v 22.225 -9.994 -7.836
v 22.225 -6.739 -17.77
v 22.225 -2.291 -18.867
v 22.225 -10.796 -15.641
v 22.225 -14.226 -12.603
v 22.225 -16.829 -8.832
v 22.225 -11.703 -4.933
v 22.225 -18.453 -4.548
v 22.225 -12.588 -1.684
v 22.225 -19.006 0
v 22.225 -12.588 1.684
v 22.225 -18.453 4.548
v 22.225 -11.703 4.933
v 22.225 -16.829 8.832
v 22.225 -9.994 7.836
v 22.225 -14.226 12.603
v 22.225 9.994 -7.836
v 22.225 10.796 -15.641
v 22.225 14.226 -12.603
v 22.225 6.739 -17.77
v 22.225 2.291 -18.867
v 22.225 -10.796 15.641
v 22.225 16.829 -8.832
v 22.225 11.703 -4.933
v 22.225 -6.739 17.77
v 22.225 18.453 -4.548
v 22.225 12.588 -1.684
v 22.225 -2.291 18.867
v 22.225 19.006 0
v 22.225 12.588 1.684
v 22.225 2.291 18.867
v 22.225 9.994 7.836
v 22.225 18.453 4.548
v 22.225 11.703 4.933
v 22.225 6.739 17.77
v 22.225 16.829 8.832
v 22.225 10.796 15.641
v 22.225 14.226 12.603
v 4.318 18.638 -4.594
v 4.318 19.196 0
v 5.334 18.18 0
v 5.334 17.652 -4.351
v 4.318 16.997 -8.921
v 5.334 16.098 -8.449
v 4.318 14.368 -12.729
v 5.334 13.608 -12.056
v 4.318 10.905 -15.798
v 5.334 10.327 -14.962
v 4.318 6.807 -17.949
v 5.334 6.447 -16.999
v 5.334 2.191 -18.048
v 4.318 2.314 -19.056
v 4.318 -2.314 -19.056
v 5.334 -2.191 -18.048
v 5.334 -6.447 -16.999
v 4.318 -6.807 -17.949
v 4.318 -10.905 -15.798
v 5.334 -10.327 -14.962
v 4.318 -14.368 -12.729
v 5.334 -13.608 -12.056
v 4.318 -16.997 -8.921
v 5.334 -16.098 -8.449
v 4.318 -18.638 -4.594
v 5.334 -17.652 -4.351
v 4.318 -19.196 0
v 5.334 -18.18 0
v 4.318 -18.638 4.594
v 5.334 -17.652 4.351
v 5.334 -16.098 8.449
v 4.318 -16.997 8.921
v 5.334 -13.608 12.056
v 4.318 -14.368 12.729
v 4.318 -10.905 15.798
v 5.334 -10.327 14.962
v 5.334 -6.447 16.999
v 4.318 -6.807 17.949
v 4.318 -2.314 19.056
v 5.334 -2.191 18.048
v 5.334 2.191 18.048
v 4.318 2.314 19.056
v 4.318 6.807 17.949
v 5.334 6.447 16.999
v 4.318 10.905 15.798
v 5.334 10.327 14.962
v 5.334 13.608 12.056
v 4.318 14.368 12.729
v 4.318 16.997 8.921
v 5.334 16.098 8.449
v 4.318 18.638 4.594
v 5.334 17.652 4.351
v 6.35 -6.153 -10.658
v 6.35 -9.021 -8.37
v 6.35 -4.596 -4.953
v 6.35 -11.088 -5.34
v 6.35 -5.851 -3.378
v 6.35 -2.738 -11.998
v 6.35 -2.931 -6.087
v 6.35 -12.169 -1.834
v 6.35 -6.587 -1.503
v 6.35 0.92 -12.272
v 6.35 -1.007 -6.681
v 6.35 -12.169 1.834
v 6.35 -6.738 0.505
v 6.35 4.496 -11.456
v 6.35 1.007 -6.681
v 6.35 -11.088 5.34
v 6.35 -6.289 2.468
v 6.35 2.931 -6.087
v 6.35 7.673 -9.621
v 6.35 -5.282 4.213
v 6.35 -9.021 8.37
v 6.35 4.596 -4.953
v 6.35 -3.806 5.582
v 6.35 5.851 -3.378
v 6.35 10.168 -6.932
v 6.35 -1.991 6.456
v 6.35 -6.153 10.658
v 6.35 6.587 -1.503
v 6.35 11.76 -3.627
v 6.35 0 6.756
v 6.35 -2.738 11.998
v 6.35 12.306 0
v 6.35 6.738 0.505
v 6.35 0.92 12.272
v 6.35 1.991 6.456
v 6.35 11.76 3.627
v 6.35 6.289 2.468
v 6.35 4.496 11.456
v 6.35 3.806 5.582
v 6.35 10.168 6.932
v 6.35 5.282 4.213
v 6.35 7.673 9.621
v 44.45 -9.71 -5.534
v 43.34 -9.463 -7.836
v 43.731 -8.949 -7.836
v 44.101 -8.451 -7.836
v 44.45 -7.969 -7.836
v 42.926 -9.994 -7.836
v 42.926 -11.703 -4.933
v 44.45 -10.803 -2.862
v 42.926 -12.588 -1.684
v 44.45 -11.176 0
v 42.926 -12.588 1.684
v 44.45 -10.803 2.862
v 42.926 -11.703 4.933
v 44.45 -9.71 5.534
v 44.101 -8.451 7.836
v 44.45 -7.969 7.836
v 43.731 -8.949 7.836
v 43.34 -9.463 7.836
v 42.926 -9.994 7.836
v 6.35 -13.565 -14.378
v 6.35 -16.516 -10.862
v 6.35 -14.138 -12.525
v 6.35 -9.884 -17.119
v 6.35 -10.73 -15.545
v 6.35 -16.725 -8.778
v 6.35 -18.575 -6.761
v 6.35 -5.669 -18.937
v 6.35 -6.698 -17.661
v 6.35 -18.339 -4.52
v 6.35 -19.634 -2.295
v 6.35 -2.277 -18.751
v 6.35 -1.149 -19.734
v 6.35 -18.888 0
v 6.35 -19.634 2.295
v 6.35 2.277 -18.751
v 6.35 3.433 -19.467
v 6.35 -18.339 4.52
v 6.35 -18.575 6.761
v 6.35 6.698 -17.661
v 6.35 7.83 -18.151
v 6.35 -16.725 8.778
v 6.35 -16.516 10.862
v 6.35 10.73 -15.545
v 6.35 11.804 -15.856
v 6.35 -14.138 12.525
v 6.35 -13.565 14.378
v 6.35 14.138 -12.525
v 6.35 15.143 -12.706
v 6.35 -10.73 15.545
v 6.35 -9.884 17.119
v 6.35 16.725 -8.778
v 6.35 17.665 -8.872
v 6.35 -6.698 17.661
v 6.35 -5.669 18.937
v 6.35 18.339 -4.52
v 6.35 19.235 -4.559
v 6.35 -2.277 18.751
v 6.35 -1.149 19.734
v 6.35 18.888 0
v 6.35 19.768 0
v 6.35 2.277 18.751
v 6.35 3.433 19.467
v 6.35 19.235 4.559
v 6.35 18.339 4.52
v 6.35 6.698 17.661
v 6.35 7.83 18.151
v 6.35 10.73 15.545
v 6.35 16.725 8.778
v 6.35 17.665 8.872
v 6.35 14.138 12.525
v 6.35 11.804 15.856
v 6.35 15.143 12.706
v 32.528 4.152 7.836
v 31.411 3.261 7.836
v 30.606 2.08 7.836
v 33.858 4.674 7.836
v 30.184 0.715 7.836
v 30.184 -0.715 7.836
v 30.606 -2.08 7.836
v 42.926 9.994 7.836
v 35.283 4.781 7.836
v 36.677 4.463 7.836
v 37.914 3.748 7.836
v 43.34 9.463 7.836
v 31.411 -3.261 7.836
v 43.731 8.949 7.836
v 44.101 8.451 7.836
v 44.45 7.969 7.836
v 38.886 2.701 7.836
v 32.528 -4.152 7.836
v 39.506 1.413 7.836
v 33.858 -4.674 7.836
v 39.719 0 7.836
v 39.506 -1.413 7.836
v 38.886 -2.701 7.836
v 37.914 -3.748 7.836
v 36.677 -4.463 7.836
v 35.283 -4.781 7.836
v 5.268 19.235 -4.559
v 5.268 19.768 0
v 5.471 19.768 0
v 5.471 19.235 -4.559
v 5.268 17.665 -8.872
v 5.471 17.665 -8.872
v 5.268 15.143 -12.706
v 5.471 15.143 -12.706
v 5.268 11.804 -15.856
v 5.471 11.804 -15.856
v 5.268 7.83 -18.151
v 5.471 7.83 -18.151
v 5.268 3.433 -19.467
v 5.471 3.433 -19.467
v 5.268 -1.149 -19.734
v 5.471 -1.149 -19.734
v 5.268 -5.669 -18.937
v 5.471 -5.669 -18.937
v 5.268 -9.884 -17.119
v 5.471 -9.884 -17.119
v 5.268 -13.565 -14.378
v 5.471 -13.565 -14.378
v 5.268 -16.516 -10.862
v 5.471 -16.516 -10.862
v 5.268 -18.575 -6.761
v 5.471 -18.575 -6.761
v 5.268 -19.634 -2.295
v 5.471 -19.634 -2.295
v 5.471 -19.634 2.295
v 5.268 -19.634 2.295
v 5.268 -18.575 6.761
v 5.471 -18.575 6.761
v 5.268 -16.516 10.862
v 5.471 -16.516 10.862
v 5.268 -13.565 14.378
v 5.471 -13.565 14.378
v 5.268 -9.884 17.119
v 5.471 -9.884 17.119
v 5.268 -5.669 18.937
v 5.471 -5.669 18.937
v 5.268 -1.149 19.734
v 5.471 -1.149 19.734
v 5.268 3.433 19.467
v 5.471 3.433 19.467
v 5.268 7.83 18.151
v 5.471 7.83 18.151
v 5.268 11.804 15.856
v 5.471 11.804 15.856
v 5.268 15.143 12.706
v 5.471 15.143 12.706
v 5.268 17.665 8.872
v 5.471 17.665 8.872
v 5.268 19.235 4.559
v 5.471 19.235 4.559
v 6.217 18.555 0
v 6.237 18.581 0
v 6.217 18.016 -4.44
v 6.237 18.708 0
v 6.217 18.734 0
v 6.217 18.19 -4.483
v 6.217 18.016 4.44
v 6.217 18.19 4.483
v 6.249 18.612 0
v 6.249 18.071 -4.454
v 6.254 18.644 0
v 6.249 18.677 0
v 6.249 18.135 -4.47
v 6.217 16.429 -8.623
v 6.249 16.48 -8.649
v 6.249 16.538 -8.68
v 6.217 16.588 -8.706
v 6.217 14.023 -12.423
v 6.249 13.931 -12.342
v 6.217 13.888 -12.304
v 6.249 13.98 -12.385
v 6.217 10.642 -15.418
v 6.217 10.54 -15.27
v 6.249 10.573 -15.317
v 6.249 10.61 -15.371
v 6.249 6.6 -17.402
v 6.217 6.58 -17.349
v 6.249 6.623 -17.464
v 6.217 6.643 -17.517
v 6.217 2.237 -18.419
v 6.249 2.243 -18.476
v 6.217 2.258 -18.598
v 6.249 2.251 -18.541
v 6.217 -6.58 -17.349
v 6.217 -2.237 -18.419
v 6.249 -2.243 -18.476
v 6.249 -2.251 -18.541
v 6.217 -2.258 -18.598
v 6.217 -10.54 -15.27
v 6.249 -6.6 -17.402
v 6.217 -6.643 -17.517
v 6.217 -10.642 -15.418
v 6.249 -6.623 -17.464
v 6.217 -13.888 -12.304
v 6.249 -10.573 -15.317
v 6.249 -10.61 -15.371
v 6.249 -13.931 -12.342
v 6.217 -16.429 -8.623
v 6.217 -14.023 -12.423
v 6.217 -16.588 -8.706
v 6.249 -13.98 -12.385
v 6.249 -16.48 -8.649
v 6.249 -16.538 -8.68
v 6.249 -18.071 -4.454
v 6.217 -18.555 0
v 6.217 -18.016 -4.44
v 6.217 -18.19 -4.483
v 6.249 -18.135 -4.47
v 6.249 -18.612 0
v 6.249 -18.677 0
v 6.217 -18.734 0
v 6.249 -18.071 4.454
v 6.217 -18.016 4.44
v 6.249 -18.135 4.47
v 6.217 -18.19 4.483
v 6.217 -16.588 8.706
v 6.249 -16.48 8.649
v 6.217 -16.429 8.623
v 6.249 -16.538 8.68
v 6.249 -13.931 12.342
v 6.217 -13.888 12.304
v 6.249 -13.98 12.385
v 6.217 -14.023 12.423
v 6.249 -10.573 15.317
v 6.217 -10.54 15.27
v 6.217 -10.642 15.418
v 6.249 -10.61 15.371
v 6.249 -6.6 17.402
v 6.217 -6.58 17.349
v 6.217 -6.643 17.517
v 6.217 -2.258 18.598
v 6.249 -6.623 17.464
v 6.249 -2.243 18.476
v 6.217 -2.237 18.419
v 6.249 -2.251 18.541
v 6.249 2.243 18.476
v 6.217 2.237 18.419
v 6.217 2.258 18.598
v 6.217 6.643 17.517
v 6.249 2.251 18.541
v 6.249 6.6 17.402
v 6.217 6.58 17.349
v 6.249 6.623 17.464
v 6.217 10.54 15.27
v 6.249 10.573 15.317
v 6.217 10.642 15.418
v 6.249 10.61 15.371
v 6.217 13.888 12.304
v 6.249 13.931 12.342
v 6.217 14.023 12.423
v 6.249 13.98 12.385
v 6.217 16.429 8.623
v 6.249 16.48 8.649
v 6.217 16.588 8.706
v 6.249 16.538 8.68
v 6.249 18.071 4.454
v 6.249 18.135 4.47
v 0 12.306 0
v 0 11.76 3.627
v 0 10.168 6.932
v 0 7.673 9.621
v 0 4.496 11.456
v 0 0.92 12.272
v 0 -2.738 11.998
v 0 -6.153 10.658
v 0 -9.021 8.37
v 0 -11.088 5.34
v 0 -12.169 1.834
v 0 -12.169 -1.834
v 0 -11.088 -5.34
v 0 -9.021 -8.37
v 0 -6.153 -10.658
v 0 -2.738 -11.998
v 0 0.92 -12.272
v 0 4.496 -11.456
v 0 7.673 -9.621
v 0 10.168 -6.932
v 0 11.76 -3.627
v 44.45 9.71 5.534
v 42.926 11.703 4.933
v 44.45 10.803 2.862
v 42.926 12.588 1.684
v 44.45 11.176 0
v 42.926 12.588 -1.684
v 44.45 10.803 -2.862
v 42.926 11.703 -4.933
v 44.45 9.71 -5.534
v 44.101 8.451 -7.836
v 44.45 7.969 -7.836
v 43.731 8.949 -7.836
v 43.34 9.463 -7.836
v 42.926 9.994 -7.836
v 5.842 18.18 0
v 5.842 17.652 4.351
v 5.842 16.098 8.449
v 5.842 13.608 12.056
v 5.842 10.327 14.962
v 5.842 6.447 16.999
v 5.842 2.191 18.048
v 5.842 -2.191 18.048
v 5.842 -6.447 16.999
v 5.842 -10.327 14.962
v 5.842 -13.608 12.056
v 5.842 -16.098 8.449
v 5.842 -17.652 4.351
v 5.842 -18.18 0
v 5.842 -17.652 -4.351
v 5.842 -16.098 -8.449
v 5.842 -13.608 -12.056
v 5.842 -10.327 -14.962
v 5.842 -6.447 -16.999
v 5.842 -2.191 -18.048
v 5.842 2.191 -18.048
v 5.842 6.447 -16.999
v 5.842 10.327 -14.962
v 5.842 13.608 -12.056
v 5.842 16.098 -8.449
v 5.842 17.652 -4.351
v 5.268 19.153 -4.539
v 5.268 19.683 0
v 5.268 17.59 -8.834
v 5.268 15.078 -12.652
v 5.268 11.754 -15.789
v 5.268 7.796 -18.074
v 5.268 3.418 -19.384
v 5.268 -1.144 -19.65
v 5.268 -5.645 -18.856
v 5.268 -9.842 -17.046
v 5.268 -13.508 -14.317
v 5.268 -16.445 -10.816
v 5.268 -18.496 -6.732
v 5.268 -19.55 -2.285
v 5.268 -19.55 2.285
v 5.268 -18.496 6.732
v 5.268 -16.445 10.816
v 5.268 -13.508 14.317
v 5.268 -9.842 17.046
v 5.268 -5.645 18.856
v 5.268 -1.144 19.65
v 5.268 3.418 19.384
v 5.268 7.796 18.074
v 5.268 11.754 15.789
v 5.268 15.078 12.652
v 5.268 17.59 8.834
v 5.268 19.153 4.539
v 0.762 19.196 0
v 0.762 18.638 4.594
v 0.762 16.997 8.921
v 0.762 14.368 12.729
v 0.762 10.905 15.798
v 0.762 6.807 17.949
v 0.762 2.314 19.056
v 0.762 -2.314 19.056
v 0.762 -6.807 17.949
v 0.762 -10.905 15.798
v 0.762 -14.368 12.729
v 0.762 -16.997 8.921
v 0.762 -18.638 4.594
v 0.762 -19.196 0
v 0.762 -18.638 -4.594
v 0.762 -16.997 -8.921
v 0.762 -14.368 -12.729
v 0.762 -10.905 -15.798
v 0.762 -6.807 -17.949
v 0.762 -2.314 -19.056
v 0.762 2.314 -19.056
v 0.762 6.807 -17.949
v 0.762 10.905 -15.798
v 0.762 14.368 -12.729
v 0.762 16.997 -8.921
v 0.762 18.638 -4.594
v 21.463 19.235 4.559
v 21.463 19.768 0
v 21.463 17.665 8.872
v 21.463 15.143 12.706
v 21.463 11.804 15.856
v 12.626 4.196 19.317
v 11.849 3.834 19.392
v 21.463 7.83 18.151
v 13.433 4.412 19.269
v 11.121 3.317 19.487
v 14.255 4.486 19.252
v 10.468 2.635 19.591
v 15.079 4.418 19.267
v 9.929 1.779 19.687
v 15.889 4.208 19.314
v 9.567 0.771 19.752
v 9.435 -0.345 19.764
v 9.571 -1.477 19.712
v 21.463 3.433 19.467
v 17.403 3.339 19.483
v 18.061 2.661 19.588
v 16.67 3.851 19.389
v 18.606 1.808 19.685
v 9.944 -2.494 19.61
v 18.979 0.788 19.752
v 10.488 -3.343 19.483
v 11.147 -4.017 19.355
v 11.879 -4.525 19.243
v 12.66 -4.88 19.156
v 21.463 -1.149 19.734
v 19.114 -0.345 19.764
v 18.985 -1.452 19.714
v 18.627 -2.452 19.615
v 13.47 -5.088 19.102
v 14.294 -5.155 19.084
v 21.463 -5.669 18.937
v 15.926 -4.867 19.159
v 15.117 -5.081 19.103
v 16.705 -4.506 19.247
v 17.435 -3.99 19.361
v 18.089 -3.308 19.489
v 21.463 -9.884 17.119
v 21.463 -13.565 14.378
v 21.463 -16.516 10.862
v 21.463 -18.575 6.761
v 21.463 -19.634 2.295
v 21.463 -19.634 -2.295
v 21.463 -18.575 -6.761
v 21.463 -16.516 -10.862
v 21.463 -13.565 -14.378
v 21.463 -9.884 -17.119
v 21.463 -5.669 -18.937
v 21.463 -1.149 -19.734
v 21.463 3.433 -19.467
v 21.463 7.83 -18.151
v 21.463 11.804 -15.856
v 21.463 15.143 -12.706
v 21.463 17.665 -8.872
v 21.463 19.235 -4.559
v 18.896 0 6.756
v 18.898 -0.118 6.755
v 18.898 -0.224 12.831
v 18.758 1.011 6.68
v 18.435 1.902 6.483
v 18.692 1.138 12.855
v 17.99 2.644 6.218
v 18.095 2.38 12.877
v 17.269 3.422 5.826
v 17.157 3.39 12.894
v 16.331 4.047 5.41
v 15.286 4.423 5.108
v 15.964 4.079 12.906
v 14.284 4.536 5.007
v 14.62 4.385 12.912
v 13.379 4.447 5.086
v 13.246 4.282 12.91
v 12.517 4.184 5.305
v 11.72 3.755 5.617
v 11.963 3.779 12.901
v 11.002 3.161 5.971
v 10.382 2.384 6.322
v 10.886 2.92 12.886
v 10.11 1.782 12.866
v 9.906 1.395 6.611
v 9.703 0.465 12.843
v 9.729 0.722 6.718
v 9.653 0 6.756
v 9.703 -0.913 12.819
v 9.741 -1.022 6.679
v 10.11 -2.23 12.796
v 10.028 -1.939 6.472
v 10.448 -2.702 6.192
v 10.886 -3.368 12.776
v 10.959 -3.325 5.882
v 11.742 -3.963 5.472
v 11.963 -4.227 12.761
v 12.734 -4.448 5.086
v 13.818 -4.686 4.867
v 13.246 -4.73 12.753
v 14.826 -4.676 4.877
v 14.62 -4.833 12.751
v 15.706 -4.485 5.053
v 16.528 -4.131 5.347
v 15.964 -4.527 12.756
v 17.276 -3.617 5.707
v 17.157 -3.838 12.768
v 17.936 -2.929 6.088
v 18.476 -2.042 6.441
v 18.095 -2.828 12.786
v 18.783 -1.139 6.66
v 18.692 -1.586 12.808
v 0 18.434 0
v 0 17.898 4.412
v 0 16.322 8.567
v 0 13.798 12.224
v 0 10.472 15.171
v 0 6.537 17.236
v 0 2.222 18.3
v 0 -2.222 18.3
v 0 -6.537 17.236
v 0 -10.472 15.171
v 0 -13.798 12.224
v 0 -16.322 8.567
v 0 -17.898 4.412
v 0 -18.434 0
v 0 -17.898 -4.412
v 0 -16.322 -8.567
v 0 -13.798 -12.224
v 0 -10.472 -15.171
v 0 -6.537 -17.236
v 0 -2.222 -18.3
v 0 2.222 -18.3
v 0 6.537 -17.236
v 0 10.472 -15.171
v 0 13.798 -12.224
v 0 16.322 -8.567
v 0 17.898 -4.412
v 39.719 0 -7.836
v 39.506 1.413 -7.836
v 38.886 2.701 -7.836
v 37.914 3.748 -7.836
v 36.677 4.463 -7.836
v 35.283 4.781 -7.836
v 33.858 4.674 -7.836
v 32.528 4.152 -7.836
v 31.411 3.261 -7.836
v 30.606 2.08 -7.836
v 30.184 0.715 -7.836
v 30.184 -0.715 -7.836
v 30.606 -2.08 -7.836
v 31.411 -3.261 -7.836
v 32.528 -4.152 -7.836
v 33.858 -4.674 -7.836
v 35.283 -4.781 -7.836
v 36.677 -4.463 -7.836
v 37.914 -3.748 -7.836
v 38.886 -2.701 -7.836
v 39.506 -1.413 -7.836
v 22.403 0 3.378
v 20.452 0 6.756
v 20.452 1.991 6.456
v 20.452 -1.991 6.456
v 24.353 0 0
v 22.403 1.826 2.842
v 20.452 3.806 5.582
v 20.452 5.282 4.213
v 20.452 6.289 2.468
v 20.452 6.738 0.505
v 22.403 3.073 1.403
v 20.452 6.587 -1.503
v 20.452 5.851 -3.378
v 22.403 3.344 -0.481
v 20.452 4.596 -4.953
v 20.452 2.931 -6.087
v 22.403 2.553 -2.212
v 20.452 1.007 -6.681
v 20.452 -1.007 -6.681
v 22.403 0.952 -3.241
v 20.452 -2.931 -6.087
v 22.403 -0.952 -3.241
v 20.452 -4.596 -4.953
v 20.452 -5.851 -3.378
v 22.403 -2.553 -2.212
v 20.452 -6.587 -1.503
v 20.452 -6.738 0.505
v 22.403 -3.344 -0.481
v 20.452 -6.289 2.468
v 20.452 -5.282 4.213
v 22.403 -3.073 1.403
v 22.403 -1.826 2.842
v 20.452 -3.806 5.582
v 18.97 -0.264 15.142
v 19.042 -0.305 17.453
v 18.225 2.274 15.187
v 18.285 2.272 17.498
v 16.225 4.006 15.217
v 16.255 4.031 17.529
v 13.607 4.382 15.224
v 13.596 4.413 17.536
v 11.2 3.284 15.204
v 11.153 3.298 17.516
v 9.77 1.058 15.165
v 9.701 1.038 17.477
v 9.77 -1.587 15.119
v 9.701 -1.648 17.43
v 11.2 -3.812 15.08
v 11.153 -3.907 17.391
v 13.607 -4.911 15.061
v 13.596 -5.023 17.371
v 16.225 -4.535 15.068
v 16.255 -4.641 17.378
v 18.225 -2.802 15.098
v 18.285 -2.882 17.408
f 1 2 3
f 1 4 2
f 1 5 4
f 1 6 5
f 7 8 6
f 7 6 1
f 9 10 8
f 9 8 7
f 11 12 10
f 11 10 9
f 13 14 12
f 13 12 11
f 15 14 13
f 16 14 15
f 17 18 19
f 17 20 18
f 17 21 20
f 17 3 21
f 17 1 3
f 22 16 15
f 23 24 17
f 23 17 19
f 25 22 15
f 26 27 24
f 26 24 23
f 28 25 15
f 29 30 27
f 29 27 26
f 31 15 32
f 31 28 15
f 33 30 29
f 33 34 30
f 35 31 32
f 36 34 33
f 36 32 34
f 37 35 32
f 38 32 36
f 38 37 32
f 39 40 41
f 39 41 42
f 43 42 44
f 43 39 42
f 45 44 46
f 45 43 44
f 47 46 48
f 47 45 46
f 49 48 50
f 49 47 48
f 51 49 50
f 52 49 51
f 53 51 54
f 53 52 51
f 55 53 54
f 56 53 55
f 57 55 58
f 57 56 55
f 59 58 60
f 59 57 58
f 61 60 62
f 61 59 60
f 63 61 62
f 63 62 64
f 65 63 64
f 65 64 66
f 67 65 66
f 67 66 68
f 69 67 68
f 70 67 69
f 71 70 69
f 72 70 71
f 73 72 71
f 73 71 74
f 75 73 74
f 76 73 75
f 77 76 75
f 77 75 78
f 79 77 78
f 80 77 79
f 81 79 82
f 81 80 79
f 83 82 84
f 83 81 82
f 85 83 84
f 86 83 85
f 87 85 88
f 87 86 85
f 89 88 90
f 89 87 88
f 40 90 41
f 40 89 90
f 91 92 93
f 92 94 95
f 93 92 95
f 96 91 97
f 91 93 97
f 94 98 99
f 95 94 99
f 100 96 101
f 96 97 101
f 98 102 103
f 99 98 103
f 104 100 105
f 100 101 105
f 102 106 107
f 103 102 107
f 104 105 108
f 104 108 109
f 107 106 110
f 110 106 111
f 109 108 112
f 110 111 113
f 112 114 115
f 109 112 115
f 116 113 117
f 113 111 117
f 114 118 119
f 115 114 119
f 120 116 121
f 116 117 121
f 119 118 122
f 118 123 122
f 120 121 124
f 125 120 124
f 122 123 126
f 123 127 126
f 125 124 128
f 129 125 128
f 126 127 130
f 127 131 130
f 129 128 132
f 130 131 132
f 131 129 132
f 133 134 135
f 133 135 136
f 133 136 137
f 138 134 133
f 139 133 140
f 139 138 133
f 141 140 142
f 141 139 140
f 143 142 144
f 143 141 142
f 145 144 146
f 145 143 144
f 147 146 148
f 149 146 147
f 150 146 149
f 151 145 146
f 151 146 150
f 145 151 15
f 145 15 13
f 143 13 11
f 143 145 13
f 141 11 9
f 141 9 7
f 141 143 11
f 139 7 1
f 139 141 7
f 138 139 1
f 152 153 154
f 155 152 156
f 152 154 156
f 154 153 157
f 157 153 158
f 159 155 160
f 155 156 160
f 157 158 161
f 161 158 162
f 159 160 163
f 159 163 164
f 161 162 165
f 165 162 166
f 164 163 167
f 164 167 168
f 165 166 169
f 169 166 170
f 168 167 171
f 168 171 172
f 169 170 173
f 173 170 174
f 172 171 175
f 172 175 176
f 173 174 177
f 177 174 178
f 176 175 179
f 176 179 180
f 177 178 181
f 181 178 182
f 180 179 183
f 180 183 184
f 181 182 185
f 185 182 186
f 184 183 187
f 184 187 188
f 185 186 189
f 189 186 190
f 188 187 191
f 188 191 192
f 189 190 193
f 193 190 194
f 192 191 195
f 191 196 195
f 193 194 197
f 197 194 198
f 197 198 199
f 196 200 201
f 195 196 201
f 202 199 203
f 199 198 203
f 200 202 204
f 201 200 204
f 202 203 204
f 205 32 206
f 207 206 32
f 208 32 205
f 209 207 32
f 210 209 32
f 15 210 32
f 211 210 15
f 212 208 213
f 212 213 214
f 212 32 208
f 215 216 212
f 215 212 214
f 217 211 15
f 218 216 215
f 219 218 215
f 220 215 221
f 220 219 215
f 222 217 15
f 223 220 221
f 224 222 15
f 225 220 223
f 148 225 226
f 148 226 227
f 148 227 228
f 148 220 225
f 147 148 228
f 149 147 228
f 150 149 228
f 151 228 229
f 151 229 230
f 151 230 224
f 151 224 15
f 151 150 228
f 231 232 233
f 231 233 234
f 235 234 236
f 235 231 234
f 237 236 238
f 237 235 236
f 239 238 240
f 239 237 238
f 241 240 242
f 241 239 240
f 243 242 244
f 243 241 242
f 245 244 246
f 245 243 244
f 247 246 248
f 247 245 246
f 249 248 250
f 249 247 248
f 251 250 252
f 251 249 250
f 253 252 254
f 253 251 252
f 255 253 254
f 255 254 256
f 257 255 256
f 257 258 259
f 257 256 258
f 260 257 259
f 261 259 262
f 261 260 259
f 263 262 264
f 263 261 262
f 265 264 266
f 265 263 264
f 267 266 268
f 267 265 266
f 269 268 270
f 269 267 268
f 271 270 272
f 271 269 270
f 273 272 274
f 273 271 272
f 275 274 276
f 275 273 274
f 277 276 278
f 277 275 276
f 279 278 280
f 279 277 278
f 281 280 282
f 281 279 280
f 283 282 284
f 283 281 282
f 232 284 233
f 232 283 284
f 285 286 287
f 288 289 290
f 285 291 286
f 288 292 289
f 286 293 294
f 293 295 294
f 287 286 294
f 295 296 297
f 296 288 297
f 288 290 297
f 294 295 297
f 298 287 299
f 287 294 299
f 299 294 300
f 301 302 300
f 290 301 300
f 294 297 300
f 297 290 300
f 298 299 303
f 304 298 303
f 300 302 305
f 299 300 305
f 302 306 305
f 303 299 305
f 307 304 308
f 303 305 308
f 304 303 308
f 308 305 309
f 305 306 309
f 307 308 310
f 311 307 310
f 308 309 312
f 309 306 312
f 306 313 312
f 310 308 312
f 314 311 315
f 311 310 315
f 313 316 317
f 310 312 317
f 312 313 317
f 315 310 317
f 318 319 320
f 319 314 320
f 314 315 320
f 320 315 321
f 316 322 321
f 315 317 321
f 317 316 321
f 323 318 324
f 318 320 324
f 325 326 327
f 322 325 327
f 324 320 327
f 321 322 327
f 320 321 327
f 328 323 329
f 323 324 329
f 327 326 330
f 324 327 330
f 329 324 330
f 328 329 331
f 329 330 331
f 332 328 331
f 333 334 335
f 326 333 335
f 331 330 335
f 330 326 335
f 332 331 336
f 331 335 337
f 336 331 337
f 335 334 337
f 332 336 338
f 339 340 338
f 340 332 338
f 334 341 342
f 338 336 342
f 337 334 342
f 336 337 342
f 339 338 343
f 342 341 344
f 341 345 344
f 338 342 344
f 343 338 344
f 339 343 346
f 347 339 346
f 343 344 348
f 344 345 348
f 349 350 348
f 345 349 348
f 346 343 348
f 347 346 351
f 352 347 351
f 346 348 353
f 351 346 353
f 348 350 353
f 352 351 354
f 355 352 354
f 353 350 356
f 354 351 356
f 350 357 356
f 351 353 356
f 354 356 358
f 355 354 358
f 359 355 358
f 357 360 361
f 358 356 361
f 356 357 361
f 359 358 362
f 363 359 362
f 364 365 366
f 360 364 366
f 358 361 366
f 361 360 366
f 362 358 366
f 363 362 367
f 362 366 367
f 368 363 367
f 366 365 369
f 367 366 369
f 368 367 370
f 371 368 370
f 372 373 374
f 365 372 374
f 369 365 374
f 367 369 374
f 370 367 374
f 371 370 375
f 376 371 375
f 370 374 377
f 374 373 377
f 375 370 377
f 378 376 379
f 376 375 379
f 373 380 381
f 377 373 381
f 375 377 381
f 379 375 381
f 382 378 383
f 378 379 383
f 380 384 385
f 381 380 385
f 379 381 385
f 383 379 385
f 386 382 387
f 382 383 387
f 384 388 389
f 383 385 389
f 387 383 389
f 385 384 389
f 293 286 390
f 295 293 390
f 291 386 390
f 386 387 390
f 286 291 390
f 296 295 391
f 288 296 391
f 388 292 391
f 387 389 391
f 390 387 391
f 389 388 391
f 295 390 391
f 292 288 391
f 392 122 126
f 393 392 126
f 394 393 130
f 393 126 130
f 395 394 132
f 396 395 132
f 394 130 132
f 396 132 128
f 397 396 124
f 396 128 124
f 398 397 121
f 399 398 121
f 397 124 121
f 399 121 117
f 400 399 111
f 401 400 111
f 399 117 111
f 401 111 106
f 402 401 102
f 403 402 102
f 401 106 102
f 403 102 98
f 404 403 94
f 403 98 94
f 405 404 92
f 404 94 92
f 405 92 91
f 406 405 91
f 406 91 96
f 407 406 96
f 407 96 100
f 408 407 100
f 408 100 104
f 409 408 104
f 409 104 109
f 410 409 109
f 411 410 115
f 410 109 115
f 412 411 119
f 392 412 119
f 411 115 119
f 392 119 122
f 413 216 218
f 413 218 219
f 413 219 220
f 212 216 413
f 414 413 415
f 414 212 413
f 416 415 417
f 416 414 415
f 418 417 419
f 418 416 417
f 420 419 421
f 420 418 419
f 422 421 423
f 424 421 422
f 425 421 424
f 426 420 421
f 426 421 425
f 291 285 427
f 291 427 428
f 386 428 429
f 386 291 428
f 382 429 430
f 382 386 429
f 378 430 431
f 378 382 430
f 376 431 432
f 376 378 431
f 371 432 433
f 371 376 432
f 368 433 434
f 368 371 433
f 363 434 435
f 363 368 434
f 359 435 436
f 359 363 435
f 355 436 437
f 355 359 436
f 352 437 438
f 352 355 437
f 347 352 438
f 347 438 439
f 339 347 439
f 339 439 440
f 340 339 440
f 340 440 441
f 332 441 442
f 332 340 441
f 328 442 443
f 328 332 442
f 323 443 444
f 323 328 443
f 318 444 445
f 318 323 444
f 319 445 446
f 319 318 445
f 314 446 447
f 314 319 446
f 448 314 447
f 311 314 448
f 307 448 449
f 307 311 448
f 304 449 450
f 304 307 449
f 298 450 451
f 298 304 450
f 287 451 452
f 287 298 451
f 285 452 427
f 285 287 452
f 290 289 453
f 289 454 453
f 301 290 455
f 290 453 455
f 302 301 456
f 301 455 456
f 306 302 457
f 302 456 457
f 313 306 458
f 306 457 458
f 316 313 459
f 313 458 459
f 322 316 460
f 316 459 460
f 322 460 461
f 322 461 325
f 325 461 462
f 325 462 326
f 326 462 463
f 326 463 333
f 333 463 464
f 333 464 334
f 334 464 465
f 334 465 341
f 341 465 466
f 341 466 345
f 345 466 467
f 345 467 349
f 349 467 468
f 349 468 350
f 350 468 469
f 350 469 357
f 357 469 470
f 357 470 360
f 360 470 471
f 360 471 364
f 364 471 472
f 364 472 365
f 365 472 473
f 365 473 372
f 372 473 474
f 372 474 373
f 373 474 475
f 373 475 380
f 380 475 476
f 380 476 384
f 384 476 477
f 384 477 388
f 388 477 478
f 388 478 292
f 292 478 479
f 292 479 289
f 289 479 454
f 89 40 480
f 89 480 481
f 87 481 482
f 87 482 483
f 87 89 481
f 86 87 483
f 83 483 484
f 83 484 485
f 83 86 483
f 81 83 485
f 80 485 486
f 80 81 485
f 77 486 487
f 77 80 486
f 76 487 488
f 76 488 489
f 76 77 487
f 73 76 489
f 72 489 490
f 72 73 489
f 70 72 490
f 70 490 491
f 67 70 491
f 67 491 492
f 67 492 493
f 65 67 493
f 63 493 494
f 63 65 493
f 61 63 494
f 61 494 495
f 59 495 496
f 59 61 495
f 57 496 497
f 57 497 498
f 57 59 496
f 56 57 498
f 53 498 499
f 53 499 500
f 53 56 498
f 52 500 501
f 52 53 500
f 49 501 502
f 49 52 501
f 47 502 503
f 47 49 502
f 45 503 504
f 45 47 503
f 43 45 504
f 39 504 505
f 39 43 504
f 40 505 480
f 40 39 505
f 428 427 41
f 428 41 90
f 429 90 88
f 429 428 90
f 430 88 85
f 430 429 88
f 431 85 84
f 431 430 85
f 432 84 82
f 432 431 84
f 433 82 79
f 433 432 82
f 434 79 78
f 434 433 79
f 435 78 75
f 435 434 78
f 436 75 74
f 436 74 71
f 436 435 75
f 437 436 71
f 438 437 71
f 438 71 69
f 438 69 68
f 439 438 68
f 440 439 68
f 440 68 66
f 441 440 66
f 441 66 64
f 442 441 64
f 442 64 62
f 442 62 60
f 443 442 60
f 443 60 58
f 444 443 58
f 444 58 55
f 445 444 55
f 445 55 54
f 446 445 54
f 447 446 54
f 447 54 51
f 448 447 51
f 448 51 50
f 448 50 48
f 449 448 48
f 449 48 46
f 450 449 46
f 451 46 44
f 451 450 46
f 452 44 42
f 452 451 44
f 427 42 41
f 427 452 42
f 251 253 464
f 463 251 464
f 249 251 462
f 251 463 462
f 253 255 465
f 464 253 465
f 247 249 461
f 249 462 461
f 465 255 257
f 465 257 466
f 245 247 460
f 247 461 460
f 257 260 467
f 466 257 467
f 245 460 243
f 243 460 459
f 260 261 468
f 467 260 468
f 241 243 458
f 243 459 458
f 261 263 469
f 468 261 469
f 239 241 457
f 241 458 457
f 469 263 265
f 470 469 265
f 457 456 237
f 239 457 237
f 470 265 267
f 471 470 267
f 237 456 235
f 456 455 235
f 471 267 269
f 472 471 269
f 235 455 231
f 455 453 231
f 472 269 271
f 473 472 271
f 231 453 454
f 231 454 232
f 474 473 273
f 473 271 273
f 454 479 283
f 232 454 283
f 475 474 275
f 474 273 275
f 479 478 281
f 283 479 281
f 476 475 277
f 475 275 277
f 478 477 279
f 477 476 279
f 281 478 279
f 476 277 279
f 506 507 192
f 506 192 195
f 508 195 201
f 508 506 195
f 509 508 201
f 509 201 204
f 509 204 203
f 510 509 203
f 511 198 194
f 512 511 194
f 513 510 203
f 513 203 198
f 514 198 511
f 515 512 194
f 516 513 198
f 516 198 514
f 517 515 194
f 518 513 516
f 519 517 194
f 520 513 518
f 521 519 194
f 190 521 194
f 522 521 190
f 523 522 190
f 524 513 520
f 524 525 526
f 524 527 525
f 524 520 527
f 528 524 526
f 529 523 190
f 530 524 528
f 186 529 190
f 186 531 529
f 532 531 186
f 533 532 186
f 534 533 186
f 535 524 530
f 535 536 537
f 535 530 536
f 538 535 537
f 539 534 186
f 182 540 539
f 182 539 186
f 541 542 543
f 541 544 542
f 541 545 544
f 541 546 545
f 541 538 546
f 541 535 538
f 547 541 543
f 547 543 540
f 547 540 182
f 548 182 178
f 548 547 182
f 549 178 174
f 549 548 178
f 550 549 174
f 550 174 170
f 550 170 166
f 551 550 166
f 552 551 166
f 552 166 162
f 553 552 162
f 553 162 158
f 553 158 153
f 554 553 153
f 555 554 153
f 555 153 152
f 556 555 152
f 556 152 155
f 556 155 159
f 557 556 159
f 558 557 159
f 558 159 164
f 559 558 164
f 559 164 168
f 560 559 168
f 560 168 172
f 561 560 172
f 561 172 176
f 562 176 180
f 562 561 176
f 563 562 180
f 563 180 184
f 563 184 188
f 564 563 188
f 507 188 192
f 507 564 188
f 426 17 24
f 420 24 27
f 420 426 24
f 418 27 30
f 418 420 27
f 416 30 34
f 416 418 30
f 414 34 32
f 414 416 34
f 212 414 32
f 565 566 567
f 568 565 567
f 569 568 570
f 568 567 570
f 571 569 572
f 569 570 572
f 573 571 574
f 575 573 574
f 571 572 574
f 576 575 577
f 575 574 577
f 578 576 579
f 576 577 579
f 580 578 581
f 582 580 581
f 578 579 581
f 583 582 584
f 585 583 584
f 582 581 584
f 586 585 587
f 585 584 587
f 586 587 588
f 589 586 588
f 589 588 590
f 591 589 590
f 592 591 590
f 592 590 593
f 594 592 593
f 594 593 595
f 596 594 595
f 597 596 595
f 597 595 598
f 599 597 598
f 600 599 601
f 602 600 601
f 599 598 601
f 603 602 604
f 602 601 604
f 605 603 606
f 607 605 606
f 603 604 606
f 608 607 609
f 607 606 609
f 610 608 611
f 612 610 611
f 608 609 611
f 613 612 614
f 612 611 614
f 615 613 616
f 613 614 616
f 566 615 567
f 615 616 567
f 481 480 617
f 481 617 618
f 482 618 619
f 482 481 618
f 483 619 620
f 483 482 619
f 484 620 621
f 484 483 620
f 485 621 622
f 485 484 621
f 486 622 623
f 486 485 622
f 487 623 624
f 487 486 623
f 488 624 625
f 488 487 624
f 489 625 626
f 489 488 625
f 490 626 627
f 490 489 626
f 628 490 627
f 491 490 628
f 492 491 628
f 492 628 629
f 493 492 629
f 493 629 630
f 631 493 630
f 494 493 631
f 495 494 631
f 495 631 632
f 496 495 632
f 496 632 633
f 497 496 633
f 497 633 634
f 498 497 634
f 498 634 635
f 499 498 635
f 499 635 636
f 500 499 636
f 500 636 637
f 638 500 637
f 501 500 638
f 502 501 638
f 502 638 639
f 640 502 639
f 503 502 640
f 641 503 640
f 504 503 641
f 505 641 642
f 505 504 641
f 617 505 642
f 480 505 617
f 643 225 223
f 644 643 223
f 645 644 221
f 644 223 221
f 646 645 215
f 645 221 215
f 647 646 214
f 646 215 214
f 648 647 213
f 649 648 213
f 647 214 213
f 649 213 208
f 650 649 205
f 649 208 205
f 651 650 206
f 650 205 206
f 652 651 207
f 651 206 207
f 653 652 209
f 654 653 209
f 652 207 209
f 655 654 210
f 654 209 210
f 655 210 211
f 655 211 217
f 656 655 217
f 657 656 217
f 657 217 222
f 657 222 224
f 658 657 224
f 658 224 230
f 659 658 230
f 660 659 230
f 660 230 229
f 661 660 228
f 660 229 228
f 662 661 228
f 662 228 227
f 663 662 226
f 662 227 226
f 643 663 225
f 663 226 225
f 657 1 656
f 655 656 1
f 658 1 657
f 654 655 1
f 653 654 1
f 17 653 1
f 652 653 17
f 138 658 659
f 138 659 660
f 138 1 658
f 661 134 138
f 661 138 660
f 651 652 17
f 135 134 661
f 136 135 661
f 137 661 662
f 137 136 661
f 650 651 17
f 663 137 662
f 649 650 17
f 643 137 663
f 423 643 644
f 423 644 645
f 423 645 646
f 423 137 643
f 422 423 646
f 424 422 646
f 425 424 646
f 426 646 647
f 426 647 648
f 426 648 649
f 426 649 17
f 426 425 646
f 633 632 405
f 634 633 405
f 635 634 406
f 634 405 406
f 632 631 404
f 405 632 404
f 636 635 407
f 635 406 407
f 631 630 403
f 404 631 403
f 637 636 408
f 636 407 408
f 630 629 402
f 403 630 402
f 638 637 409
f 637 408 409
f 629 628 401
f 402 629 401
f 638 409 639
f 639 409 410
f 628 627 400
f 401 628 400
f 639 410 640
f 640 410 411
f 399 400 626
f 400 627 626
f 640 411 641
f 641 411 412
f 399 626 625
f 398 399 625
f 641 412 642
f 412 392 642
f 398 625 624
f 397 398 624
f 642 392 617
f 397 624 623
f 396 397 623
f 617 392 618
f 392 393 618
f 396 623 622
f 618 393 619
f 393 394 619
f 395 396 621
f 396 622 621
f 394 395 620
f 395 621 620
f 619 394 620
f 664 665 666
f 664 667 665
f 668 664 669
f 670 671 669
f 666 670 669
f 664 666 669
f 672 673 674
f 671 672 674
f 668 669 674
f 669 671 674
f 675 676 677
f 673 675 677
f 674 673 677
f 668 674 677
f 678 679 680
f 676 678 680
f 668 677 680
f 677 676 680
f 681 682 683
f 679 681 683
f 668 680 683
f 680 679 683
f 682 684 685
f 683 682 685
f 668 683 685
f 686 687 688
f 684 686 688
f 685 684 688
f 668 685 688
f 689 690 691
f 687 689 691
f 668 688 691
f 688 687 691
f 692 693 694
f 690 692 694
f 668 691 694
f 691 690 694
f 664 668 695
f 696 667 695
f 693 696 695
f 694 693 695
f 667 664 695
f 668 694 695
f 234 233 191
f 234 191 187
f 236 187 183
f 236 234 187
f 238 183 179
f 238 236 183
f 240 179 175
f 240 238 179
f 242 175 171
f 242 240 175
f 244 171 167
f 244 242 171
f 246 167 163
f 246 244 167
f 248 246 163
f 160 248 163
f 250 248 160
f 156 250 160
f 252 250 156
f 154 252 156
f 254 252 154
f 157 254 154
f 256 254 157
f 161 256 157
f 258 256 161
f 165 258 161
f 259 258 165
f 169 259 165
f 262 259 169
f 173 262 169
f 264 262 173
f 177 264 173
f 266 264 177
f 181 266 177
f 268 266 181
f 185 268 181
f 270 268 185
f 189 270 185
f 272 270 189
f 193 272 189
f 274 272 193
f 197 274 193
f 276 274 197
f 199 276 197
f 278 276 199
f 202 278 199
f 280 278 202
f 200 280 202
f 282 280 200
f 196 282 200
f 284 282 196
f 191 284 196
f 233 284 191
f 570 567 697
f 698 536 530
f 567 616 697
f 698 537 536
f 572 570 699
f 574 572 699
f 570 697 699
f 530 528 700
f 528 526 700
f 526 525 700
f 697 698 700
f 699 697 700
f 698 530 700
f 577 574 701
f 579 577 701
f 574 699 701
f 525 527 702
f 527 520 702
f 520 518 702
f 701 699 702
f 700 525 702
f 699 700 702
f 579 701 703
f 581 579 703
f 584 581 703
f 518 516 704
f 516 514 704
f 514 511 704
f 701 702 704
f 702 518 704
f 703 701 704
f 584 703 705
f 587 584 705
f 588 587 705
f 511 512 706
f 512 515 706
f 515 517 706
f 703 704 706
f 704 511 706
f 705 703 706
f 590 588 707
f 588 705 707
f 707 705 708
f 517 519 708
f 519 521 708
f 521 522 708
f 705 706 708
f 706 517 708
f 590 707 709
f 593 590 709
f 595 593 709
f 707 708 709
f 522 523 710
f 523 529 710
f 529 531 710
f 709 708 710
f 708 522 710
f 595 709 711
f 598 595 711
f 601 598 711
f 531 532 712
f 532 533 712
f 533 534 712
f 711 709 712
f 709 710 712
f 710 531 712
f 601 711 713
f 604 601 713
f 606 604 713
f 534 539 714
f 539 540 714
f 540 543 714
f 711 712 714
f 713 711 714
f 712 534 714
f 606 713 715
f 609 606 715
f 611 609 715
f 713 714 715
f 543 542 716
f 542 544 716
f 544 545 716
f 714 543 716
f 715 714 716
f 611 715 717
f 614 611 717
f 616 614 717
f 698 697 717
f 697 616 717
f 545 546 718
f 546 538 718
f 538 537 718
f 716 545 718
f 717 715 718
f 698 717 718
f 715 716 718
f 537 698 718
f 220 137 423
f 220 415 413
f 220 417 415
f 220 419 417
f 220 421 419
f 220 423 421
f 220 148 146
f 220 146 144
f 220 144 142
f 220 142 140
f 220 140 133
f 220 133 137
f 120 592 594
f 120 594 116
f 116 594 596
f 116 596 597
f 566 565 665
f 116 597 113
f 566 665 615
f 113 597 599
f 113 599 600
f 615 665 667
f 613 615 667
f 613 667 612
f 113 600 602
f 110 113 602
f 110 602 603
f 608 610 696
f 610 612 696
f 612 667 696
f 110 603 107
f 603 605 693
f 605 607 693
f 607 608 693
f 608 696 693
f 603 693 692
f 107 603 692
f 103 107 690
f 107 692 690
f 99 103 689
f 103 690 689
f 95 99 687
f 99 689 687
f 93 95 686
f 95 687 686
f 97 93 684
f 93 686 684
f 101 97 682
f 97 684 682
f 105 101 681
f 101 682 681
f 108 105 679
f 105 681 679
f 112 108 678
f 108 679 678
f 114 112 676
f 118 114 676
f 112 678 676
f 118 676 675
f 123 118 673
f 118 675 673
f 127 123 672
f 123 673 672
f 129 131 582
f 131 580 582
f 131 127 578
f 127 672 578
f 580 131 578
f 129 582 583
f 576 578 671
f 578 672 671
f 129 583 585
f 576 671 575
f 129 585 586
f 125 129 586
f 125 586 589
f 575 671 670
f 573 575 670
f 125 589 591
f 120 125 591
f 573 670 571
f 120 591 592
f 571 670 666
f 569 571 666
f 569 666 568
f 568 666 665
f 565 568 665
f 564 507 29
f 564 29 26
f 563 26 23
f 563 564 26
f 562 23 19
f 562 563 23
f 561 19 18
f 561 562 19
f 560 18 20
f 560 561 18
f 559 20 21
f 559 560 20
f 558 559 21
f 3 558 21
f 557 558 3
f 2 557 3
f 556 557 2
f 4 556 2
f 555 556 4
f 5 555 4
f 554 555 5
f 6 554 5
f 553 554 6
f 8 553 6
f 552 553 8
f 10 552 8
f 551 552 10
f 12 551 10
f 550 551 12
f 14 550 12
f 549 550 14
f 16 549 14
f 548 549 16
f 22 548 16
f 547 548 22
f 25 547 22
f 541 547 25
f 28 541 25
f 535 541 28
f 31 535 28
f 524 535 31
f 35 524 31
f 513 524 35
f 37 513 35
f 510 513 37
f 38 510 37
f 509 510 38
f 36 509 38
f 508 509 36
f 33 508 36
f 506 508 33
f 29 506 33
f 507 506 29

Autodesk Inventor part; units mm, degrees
sketch "Sketch_18" plane through (0, 0, 0) normal (0, 0, 1) x (1, 0, 0)
  line L0 (22.225, 0) -> (0, 0)
  line L1 (0, 0) -> (0, 18.434)
  line L2 (0, 18.434) -> (0.762, 19.196)
  line L3 (0.762, 19.196) -> (4.318, 19.196)
  line L4 (4.318, 19.196) -> (5.334, 18.1801)
  line L5 (5.334, 18.1801) -> (6.35, 18.1801)
  line L6 (6.35, 18.1801) -> (6.35, 19.7675)
  line L7 (6.35, 19.7675) -> (21.463, 19.7675)
  line L8 (21.463, 19.7675) -> (22.225, 19.0055)
  line L9 (22.225, 19.0055) -> (22.225, 0)
  line L10 (22.225, 0) -> (0, 0)
revolve "Revolution1" add sketch "Sketch_18" angle 360 about axis through (22.225, 0, 0) along (1, 0, 0)
sketch "Sketch_21" plane through (0, 0, 0) normal (0, 0, 1) x (1, 0, 0)
  line L0 (44.45, 0) -> (22.225, 0)
  line L1 (22.225, 0) -> (22.225, 12.7)
  line L2 (22.225, 12.7) -> (42.926, 12.7)
  line L3 (42.926, 12.7) -> (44.45, 11.176)
  line L4 (44.45, 11.176) -> (44.45, 0)
  line L5 (44.45, 0) -> (22.225, 0)
revolve "Revolution2" add sketch "Sketch_21" angle 360 about axis through (44.45, 0, 0) along (1, 0, 0)
sketch "Sketch_9" plane through (44.45, 0, 0) normal (1, 0, 0) x (0, 0, -1)
  line L0 (-39.5351, -79.0702) -> (39.5351, -79.0702)
  line L1 (39.5351, -79.0702) -> (39.5351, 79.0702)
  line L2 (39.5351, 79.0702) -> (-39.5351, 79.0702)
  line L3 (-39.5351, 79.0702) -> (-39.5351, -79.0702)
  line L4 (-7.8359, -39.5351) -> (7.8359, -39.5351)
  line L5 (7.8359, -39.5351) -> (7.8359, 39.5351)
  line L6 (7.8359, 39.5351) -> (-7.8359, 39.5351)
  line L7 (-7.8359, 39.5351) -> (-7.8359, -39.5351)
extrude "Extrusion1" cut sketch "Sketch_9" against normal blind 22.225
sketch "Sketch4" plane through (0, 0, 0) normal (-1, 0, 0) x (0, 0, 1)
  point P0 (0, 0)
hole "Hole1" at (0, 0, 0) direction (1, 0, 0) diameter 13.5128 depth 20.4521 tip angle 120
sketch "Sketch_68" plane through (0, 0, 0) normal (0, 0.9998477, 0.0174524) x (1, 0, 0)
  line L0 (14.2748, -19.7675) -> (14.2748, 0)
  line L1 (14.2748, 0) -> (18.8978, 0)
  line L2 (18.8978, 0) -> (18.8978, -12.8333)
  line L3 (18.8978, -12.8333) -> (19.1143, -19.7675)
  line L4 (19.1143, -19.7675) -> (14.2748, -19.7675)
  line L5 (14.2748, -19.7675) -> (14.2748, 0)
revolve "Revolution3" cut sketch "Sketch_68" angle 360 about axis through (14.2748, -0.345, 19.7645) along (0, -0.0174524, 0.9998477)
thread "Thread1" size "1/8" designation "1/8 - 27 NPT" standard "NPT" length 6.9376
sketch "Sketch_20" plane through (0, 0, 0) normal (0, 0, 1) x (1, 0, 0)
  line L0 (6.35, 0) -> (0, 0)
  line L1 (0, 0) -> (0, 12.3063)
  line L2 (0, 12.3063) -> (6.35, 12.3063)
  line L3 (6.35, 12.3063) -> (6.35, 0)
  line L4 (6.35, 0) -> (0, 0)
revolve "Revolution4" cut sketch "Sketch_20" angle 360 about axis through (6.35, 0, 0) along (1, 0, 0)
sketch "Sketch_24" plane through (0, 0, 0) normal (0, 0, 1) x (1, 0, 0)
  line L0 (6.35, 0) -> (5.334, 0)
  line L1 (5.2675, 19.7675) -> (5.2675, 19.6834)
  line L2 (5.2675, 19.6834) -> (6.2166, 18.7343)
  arc A0 (6.2166, 18.5547) -> (6.2166, 18.7343) centre (6.1268, 18.6445) ccw
  line L3 (6.2166, 18.5547) -> (5.842, 18.1801)
  line L4 (5.842, 18.1801) -> (5.334, 18.1801)
  line L5 (5.334, 18.1801) -> (5.334, 17.9261)
  line L6 (5.334, 17.9261) -> (6.35, 17.9261)
  line L7 (6.35, 17.9261) -> (6.35, 18.8883)
  line L8 (6.35, 18.8883) -> (5.4707, 19.7675)
  line L9 (5.4707, 19.7675) -> (5.2675, 19.7675)
revolve "Revolution5" add sketch "Sketch_24" angle 360 about axis through (6.35, 0, 0) along (1, 0, 0)
sketch "Sketch_43" plane through (0, 0, 0) normal (0, 0, 1) x (1, 0, 0)
  circle A0 centre (34.925, 0) radius 4.7942
extrude "Extrusion2" cut sketch "Sketch_43" along normal mid plane 23.5077
ref_plane "f_XY" through (22.225, 0, 0) normal (0, 0, 1) x (1, 0, 0)
ref_plane "f_YZ" through (22.225, 0, 0) normal (1, 0, 0) x (0, 1, 0)
ref_plane "f_ZX" through (22.225, 0, 0) normal (0, 1, 0) x (0, 0, 1)
ref_plane "lovra1_XY" through (38.1, 0, 0) normal (1, 0, 0) x (0, 0, -1)
ref_plane "lovra1_YZ" through (38.1, 0, 0) normal (0, 0, -1) x (0, 1, 0)
ref_plane "lovra1_ZX" through (38.1, 0, 0) normal (0, 1, 0) x (1, 0, 0)
ref_plane "lovra2_XY" through (38.1, 11.049, 0) normal (1, 0, 0) x (0, 0, -1)
ref_plane "lovra2_YZ" through (38.1, 11.049, 0) normal (0, 0, -1) x (0, 1, 0)
ref_plane "lovra2_ZX" through (38.1, 11.049, 0) normal (0, 1, 0) x (1, 0, 0)
ref_plane "lovra21_XY" through (0, 0, 5.2705) normal (1, 0, 0) x (0, 0, -1)
ref_plane "lovra21_YZ" through (0, 0, 5.2705) normal (0, 0, -1) x (0, 1, 0)
ref_plane "lovra21_ZX" through (0, 0, 5.2705) normal (0, 1, 0) x (1, 0, 0)
ref_plane "lovra22_XY" through (0, 0, -5.2705) normal (1, 0, 0) x (0, 0, -1)
ref_plane "lovra22_YZ" through (0, 0, -5.2705) normal (0, 0, -1) x (0, 1, 0)
ref_plane "lovra22_ZX" through (0, 0, -5.2705) normal (0, 1, 0) x (1, 0, 0)
ref_plane "lovra3_XY" through (38.1, -11.049, 0) normal (1, 0, 0) x (0, 0, -1)
ref_plane "lovra3_YZ" through (38.1, -11.049, 0) normal (0, 0, -1) x (0, 1, 0)
ref_plane "lovra3_ZX" through (38.1, -11.049, 0) normal (0, 1, 0) x (1, 0, 0)
ref_plane "olen_XY" through (34.925, 0, 0) normal (1, 0, 0) x (0, 0, -1)
ref_plane "olen_YZ" through (34.925, 0, 0) normal (0, 0, -1) x (0, 1, 0)
ref_plane "olen_ZX" through (34.925, 0, 0) normal (0, 1, 0) x (1, 0, 0)
ref_plane "p1_XY" through (44.45, 0, 7.8359) normal (1, 0, 0) x (0, 0, -1)
ref_plane "p1_YZ" through (44.45, 0, 7.8359) normal (0, 0, -1) x (0, 1, 0)
ref_plane "p1_ZX" through (44.45, 0, 7.8359) normal (0, 1, 0) x (1, 0, 0)
ref_plane "p2_XY" through (44.45, 0, -7.8359) normal (1, 0, 0) x (0, 0, -1)
ref_plane "p2_YZ" through (44.45, 0, -7.8359) normal (0, 0, -1) x (0, 1, 0)
ref_plane "p2_ZX" through (44.45, 0, -7.8359) normal (0, 1, 0) x (1, 0, 0)
ref_plane "port_XY" through (14.2748, 0, 0) normal (0, 0, 1) x (1, 0, 0)
ref_plane "port_YZ" through (14.2748, 0, 0) normal (1, 0, 0) x (0, 1, 0)
ref_plane "port_ZX" through (14.2748, 0, 0) normal (0, 1, 0) x (0, 0, 1)
ref_plane "port2_XY" through (44.45, 0, 0) normal (1, 0, 0) x (0, 0, -1)
ref_plane "port2_YZ" through (44.45, 0, 0) normal (0, 0, -1) x (0, 1, 0)
ref_plane "port2_ZX" through (44.45, 0, 0) normal (0, 1, 0) x (1, 0, 0)
ref_plane "thd1_XY" through (44.45, 0, 0) normal (1, 0, 0) x (0, 0, -1)
ref_plane "thd1_YZ" through (44.45, 0, 0) normal (0, 0, -1) x (0, 1, 0)
ref_plane "thd1_ZX" through (44.45, 0, 0) normal (0, 1, 0) x (1, 0, 0)
ref_plane "thd2_XY" through (44.45, 0, 0) normal (1, 0, 0) x (0, 0, -1)
ref_plane "thd2_YZ" through (44.45, 0, 0) normal (0, 0, -1) x (0, 1, 0)
ref_plane "thd2_ZX" through (44.45, 0, 0) normal (0, 1, 0) x (1, 0, 0)
ref_plane "to_mounting_bracket_XY" through (22.225, 0, 0) normal (1, 0, 0) x (0, 0, -1)
ref_plane "to_mounting_bracket_YZ" through (22.225, 0, 0) normal (0, 0, -1) x (0, 1, 0)
ref_plane "to_mounting_bracket_ZX" through (22.225, 0, 0) normal (0, 1, 0) x (1, 0, 0)
ref_plane "to_nut_XY" through (0, 0, 0) normal (1, 0, 0) x (0, 0, -1)
ref_plane "to_nut_YZ" through (0, 0, 0) normal (0, 0, -1) x (0, 1, 0)
ref_plane "to_nut_ZX" through (0, 0, 0) normal (0, 1, 0) x (1, 0, 0)
ref_plane "to_pin_XY" through (34.925, 0, 0) normal (0, 0, 1) x (1, 0, 0)
ref_plane "to_pin_YZ" through (34.925, 0, 0) normal (1, 0, 0) x (0, 1, 0)
ref_plane "to_pin_ZX" through (34.925, 0, 0) normal (0, 1, 0) x (0, 0, 1)
ref_plane "to_screw_XY" through (14.2748, 14.2875, -10.0838) normal (0, 1, 0) x (1, 0, 0)
ref_plane "to_screw_YZ" through (14.2748, 14.2875, -10.0838) normal (1, 0, 0) x (0, 0, -1)
ref_plane "to_screw_ZX" through (14.2748, 14.2875, -10.0838) normal (0, 0, -1) x (0, 1, 0)
ref_plane "to_tube_XY" through (5.334, 0, 0) normal (1, 0, 0) x (0, 0, -1)
ref_plane "to_tube_YZ" through (5.334, 0, 0) normal (0, 0, -1) x (0, 1, 0)
ref_plane "to_tube_ZX" through (5.334, 0, 0) normal (0, 1, 0) x (1, 0, 0)
properties part number "17P0000_rear_head"
